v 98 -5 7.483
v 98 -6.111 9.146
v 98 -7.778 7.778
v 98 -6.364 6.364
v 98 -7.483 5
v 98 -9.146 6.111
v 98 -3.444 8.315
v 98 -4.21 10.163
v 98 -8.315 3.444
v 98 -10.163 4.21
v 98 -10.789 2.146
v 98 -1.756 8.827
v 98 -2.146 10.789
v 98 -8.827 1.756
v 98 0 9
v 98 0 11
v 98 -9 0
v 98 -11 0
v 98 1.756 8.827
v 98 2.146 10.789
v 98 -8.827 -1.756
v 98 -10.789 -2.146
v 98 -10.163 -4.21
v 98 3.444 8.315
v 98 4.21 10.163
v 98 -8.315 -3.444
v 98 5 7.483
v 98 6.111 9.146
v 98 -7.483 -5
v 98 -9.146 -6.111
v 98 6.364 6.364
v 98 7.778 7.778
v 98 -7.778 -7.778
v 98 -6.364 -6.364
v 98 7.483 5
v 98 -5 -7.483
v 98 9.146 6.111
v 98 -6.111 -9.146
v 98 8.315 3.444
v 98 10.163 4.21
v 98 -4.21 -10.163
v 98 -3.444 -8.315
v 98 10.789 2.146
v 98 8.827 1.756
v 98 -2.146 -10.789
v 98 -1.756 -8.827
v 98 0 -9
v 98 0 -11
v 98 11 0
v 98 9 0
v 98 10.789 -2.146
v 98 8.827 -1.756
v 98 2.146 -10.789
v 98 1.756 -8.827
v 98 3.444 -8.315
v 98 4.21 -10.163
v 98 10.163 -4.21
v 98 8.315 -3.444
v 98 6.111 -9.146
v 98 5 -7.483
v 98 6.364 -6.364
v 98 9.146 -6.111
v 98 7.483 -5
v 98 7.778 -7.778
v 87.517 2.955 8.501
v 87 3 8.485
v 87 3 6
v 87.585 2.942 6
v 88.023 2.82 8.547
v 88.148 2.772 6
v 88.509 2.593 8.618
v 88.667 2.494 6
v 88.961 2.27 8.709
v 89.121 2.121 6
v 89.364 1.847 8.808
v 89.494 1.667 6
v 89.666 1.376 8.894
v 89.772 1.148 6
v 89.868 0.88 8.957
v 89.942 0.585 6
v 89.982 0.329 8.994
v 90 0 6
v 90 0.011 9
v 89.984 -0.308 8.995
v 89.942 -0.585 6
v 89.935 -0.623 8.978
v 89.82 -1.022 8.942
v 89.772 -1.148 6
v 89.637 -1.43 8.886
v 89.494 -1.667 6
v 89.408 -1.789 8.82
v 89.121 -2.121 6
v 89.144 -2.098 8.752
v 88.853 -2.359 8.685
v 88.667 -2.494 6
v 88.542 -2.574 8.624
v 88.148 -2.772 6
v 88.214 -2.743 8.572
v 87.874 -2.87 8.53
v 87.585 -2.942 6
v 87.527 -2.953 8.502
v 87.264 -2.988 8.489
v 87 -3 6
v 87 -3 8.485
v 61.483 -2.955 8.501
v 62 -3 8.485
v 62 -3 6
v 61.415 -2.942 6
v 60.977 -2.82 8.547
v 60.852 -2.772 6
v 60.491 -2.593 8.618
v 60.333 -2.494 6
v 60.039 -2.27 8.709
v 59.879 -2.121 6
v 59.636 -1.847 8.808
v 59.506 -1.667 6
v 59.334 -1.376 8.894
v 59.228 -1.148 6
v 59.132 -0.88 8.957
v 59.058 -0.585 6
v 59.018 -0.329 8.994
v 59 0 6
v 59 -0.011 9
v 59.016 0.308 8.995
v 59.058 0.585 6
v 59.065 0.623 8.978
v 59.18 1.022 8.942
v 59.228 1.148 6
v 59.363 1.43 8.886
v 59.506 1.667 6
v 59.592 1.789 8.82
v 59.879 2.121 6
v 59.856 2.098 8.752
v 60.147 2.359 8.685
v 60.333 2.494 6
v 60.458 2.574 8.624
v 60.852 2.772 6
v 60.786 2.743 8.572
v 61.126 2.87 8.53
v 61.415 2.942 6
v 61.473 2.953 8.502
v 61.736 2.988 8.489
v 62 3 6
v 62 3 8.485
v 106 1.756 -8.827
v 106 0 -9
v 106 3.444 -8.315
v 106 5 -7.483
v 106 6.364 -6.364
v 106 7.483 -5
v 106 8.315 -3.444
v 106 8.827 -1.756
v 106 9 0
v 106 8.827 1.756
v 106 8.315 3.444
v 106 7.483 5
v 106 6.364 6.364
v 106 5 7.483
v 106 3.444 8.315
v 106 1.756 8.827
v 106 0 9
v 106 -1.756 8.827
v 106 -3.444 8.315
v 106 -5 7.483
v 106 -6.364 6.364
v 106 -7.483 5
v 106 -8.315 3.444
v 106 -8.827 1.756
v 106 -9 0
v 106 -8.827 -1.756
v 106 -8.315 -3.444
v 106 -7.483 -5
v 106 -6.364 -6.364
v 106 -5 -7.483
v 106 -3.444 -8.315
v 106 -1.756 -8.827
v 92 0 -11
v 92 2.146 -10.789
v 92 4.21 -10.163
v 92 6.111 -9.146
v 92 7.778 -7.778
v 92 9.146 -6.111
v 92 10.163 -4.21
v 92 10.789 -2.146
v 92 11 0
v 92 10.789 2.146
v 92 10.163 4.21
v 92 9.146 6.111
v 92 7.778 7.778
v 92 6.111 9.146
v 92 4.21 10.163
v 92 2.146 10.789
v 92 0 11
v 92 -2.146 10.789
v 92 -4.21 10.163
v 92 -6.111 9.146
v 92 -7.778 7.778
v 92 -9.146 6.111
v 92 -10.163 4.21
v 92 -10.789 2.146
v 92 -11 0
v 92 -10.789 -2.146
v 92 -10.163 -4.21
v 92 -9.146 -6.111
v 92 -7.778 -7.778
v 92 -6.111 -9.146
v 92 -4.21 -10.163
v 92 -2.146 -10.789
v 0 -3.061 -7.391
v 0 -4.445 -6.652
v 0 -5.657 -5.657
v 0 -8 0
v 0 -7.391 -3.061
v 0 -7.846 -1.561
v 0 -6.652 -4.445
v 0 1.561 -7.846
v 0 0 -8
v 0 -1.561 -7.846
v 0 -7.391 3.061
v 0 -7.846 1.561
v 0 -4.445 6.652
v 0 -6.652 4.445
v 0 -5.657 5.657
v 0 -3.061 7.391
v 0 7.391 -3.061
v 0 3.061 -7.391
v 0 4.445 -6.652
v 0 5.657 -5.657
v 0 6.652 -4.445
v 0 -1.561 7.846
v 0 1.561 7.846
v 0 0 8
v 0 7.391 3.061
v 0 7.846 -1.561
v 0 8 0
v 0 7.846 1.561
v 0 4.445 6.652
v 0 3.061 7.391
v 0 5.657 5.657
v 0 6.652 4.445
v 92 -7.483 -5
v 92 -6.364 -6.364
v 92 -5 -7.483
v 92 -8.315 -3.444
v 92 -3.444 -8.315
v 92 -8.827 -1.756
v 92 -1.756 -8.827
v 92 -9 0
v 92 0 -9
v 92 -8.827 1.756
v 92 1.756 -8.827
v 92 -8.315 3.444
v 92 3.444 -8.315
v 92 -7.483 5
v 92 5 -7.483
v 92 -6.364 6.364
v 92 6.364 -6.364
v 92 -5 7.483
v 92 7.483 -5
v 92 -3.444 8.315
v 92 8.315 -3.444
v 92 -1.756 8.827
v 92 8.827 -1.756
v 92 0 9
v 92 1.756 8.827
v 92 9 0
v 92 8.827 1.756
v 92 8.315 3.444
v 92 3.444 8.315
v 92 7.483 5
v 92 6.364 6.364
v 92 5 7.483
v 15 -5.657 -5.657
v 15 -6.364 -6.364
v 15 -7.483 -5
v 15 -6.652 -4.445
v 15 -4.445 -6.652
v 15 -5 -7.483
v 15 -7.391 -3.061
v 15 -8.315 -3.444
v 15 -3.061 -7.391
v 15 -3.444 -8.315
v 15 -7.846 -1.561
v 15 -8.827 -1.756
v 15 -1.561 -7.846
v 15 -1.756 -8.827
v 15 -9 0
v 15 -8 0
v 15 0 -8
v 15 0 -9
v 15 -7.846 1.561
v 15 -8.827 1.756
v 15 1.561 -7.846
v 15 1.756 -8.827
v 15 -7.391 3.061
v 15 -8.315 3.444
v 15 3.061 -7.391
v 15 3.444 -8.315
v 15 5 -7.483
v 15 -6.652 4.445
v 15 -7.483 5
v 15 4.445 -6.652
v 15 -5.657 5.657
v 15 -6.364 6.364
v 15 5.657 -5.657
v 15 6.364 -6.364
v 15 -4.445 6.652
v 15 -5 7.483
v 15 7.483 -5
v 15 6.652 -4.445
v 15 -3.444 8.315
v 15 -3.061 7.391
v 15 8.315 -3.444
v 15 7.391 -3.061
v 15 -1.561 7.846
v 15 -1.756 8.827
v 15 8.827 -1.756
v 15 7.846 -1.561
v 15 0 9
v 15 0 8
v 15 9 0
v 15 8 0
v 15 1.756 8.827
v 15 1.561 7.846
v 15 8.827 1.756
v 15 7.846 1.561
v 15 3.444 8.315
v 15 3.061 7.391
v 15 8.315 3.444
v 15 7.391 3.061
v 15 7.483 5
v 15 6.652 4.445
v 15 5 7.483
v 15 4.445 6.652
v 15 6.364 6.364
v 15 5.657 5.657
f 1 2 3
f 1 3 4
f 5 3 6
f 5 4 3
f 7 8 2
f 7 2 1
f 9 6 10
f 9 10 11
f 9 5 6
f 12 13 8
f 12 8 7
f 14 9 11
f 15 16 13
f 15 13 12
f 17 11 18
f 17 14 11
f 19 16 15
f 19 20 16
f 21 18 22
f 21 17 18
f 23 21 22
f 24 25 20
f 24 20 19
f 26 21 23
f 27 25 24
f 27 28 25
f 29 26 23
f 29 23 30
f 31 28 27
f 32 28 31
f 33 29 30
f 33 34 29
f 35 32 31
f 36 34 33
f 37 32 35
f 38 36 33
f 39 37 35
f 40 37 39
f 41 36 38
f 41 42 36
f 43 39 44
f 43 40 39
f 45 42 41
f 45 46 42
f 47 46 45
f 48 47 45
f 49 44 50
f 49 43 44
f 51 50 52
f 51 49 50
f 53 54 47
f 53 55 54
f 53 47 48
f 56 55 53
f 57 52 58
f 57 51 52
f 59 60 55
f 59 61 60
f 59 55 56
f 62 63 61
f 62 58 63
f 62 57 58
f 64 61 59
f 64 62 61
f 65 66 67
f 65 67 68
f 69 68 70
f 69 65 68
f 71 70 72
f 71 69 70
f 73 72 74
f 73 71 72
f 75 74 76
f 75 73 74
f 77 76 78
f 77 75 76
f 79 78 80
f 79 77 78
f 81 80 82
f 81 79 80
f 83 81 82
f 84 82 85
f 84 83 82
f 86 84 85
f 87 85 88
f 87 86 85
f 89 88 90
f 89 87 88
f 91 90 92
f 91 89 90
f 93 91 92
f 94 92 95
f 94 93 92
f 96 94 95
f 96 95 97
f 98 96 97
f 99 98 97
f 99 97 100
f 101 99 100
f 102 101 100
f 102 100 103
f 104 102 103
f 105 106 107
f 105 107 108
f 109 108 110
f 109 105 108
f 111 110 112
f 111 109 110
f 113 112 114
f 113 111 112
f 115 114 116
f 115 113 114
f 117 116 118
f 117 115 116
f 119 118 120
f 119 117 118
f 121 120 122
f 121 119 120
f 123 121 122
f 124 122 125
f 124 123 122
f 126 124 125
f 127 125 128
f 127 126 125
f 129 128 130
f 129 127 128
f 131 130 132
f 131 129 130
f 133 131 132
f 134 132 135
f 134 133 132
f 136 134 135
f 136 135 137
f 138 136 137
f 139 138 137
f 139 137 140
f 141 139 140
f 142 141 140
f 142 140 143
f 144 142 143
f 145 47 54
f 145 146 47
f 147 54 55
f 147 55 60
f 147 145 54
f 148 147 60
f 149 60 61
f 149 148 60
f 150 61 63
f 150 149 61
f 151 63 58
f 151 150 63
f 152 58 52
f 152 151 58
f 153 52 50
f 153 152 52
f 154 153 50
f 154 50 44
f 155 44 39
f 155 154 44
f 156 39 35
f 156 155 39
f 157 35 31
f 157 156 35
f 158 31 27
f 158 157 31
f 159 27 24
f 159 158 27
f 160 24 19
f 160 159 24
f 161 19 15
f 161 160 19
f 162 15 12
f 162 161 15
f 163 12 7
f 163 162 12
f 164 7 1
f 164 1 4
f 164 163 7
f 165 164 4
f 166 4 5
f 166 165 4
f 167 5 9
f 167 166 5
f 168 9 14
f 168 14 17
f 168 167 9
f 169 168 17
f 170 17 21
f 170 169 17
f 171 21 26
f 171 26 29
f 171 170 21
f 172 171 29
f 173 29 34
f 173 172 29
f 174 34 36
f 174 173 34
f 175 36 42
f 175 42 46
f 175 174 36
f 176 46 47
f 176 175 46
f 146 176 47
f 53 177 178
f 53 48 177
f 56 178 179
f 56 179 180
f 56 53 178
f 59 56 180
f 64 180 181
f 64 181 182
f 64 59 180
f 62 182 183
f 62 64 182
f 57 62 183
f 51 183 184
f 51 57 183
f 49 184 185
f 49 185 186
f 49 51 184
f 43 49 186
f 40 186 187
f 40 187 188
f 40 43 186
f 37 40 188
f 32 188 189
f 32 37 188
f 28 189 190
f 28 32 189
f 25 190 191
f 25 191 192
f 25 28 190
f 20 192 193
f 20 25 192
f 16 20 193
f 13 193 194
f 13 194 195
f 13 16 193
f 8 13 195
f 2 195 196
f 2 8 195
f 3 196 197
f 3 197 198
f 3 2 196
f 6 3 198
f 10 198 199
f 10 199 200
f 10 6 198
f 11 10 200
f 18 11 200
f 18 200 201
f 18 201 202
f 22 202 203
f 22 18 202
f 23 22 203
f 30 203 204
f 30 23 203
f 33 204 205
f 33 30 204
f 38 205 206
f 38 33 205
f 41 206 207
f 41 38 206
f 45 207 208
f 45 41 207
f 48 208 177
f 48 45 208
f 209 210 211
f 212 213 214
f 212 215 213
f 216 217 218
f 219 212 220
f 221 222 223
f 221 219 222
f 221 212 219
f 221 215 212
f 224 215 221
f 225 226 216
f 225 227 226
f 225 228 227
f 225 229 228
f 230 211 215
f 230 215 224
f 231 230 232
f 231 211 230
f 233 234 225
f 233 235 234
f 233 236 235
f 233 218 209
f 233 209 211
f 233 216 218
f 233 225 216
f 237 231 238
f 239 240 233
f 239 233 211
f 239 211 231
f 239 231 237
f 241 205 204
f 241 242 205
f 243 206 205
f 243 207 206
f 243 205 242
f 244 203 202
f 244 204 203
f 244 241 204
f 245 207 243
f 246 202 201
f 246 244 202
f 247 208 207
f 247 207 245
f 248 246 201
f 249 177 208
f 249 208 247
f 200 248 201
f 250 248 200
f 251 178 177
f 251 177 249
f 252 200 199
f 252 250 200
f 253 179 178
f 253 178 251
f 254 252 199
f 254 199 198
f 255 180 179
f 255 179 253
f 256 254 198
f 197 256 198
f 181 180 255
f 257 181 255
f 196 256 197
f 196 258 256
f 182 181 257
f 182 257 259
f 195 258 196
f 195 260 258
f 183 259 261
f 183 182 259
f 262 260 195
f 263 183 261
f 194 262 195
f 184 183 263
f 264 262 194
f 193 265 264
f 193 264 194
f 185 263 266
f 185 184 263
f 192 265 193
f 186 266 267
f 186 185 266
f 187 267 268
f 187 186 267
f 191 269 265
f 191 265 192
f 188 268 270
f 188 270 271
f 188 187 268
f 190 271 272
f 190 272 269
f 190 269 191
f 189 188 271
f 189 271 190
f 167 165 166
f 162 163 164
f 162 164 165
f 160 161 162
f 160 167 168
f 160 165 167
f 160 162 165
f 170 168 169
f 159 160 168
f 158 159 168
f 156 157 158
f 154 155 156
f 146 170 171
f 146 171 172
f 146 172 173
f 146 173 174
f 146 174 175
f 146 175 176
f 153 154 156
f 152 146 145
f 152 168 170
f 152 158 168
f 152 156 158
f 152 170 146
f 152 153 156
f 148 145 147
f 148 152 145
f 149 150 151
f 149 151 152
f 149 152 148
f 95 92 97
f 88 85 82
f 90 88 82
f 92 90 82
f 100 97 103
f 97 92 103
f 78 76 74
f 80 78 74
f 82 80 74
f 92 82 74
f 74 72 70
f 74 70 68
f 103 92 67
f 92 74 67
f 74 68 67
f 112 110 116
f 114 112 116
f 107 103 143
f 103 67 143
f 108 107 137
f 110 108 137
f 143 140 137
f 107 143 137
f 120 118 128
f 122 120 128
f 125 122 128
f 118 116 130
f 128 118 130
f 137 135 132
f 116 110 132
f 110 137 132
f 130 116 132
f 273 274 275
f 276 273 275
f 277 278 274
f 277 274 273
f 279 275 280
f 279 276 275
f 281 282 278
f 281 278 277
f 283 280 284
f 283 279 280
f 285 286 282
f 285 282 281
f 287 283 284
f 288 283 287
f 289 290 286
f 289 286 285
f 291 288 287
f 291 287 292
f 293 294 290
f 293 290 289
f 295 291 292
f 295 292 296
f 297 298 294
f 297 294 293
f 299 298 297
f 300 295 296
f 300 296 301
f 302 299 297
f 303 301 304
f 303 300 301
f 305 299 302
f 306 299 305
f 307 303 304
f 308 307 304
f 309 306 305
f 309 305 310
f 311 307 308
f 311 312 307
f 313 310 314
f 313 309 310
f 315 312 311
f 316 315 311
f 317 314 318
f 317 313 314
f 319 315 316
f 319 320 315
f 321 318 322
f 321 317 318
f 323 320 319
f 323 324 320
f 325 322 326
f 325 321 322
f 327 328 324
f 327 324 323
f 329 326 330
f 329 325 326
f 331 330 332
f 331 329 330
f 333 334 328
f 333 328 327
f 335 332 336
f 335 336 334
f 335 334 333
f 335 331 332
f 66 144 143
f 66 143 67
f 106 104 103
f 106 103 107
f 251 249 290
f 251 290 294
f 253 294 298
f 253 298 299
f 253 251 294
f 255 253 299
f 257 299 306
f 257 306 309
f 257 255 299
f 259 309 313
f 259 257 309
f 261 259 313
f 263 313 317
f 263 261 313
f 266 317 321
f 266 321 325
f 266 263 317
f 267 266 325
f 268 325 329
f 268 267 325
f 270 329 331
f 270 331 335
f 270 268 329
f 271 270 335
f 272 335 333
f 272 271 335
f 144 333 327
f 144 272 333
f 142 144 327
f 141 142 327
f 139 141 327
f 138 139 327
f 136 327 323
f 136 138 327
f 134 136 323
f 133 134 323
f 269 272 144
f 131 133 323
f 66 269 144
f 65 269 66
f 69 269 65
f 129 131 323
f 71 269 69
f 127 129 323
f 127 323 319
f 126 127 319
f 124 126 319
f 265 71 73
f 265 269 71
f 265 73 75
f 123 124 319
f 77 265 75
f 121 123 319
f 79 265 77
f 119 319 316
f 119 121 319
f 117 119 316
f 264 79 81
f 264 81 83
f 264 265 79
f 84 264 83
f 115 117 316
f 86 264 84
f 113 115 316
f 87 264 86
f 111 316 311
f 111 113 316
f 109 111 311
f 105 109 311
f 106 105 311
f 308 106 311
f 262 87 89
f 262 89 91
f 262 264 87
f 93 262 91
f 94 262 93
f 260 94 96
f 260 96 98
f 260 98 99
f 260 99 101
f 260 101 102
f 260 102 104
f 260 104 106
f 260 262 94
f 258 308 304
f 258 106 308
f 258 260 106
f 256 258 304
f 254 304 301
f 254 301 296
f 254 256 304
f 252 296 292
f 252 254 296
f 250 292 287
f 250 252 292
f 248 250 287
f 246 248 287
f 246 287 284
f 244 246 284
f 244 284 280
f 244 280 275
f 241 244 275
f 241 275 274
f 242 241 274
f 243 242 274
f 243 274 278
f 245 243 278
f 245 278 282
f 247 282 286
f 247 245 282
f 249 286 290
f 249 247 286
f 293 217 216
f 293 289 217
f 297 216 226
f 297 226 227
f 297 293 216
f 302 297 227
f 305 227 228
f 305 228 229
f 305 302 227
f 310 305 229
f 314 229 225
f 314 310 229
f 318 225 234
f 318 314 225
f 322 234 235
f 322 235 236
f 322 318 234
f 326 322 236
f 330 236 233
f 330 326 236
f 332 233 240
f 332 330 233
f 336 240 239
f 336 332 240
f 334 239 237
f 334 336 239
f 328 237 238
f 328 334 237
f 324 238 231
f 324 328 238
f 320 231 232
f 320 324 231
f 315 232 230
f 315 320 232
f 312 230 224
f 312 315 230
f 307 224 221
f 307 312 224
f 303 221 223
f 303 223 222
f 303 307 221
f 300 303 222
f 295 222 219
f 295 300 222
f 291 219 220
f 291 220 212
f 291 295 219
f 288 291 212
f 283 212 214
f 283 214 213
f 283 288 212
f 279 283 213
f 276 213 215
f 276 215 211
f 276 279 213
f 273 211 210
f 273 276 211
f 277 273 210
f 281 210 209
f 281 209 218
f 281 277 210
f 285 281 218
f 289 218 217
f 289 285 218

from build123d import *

# Parameters (mm, degrees)
CUT_EXTRUDE_2_DEPTH = 3


with BuildPart() as part:
    # 草图2 → 旋转1 (revolve)
    with BuildSketch(Plane(origin=(0, 0, 0), x_dir=(1, 0, 0), z_dir=(0, 1, 0))):
        Polygon((0, 0), (0, 8), (15, 8), (15, 9), (92, 9), (92, 11), (98, 11), (98, 9), (106, 9), (106, 0), align=None)
    revolve(axis=Axis((0, 0, 0), (1, 0, 0)))

    # 草图4 → 切除-拉伸2 (cut)
    with BuildSketch(Plane.XY.offset(9)):
        with BuildLine():
            Line((62, 3), (87, 3))
            ThreePointArc((87, 3), (90, 0), (87, -3))
            Line((87, -3), (62, -3))
            ThreePointArc((62, -3), (59, 0), (62, 3))
        make_face()
    extrude(amount=-CUT_EXTRUDE_2_DEPTH, mode=Mode.SUBTRACT)


solid = part.part
